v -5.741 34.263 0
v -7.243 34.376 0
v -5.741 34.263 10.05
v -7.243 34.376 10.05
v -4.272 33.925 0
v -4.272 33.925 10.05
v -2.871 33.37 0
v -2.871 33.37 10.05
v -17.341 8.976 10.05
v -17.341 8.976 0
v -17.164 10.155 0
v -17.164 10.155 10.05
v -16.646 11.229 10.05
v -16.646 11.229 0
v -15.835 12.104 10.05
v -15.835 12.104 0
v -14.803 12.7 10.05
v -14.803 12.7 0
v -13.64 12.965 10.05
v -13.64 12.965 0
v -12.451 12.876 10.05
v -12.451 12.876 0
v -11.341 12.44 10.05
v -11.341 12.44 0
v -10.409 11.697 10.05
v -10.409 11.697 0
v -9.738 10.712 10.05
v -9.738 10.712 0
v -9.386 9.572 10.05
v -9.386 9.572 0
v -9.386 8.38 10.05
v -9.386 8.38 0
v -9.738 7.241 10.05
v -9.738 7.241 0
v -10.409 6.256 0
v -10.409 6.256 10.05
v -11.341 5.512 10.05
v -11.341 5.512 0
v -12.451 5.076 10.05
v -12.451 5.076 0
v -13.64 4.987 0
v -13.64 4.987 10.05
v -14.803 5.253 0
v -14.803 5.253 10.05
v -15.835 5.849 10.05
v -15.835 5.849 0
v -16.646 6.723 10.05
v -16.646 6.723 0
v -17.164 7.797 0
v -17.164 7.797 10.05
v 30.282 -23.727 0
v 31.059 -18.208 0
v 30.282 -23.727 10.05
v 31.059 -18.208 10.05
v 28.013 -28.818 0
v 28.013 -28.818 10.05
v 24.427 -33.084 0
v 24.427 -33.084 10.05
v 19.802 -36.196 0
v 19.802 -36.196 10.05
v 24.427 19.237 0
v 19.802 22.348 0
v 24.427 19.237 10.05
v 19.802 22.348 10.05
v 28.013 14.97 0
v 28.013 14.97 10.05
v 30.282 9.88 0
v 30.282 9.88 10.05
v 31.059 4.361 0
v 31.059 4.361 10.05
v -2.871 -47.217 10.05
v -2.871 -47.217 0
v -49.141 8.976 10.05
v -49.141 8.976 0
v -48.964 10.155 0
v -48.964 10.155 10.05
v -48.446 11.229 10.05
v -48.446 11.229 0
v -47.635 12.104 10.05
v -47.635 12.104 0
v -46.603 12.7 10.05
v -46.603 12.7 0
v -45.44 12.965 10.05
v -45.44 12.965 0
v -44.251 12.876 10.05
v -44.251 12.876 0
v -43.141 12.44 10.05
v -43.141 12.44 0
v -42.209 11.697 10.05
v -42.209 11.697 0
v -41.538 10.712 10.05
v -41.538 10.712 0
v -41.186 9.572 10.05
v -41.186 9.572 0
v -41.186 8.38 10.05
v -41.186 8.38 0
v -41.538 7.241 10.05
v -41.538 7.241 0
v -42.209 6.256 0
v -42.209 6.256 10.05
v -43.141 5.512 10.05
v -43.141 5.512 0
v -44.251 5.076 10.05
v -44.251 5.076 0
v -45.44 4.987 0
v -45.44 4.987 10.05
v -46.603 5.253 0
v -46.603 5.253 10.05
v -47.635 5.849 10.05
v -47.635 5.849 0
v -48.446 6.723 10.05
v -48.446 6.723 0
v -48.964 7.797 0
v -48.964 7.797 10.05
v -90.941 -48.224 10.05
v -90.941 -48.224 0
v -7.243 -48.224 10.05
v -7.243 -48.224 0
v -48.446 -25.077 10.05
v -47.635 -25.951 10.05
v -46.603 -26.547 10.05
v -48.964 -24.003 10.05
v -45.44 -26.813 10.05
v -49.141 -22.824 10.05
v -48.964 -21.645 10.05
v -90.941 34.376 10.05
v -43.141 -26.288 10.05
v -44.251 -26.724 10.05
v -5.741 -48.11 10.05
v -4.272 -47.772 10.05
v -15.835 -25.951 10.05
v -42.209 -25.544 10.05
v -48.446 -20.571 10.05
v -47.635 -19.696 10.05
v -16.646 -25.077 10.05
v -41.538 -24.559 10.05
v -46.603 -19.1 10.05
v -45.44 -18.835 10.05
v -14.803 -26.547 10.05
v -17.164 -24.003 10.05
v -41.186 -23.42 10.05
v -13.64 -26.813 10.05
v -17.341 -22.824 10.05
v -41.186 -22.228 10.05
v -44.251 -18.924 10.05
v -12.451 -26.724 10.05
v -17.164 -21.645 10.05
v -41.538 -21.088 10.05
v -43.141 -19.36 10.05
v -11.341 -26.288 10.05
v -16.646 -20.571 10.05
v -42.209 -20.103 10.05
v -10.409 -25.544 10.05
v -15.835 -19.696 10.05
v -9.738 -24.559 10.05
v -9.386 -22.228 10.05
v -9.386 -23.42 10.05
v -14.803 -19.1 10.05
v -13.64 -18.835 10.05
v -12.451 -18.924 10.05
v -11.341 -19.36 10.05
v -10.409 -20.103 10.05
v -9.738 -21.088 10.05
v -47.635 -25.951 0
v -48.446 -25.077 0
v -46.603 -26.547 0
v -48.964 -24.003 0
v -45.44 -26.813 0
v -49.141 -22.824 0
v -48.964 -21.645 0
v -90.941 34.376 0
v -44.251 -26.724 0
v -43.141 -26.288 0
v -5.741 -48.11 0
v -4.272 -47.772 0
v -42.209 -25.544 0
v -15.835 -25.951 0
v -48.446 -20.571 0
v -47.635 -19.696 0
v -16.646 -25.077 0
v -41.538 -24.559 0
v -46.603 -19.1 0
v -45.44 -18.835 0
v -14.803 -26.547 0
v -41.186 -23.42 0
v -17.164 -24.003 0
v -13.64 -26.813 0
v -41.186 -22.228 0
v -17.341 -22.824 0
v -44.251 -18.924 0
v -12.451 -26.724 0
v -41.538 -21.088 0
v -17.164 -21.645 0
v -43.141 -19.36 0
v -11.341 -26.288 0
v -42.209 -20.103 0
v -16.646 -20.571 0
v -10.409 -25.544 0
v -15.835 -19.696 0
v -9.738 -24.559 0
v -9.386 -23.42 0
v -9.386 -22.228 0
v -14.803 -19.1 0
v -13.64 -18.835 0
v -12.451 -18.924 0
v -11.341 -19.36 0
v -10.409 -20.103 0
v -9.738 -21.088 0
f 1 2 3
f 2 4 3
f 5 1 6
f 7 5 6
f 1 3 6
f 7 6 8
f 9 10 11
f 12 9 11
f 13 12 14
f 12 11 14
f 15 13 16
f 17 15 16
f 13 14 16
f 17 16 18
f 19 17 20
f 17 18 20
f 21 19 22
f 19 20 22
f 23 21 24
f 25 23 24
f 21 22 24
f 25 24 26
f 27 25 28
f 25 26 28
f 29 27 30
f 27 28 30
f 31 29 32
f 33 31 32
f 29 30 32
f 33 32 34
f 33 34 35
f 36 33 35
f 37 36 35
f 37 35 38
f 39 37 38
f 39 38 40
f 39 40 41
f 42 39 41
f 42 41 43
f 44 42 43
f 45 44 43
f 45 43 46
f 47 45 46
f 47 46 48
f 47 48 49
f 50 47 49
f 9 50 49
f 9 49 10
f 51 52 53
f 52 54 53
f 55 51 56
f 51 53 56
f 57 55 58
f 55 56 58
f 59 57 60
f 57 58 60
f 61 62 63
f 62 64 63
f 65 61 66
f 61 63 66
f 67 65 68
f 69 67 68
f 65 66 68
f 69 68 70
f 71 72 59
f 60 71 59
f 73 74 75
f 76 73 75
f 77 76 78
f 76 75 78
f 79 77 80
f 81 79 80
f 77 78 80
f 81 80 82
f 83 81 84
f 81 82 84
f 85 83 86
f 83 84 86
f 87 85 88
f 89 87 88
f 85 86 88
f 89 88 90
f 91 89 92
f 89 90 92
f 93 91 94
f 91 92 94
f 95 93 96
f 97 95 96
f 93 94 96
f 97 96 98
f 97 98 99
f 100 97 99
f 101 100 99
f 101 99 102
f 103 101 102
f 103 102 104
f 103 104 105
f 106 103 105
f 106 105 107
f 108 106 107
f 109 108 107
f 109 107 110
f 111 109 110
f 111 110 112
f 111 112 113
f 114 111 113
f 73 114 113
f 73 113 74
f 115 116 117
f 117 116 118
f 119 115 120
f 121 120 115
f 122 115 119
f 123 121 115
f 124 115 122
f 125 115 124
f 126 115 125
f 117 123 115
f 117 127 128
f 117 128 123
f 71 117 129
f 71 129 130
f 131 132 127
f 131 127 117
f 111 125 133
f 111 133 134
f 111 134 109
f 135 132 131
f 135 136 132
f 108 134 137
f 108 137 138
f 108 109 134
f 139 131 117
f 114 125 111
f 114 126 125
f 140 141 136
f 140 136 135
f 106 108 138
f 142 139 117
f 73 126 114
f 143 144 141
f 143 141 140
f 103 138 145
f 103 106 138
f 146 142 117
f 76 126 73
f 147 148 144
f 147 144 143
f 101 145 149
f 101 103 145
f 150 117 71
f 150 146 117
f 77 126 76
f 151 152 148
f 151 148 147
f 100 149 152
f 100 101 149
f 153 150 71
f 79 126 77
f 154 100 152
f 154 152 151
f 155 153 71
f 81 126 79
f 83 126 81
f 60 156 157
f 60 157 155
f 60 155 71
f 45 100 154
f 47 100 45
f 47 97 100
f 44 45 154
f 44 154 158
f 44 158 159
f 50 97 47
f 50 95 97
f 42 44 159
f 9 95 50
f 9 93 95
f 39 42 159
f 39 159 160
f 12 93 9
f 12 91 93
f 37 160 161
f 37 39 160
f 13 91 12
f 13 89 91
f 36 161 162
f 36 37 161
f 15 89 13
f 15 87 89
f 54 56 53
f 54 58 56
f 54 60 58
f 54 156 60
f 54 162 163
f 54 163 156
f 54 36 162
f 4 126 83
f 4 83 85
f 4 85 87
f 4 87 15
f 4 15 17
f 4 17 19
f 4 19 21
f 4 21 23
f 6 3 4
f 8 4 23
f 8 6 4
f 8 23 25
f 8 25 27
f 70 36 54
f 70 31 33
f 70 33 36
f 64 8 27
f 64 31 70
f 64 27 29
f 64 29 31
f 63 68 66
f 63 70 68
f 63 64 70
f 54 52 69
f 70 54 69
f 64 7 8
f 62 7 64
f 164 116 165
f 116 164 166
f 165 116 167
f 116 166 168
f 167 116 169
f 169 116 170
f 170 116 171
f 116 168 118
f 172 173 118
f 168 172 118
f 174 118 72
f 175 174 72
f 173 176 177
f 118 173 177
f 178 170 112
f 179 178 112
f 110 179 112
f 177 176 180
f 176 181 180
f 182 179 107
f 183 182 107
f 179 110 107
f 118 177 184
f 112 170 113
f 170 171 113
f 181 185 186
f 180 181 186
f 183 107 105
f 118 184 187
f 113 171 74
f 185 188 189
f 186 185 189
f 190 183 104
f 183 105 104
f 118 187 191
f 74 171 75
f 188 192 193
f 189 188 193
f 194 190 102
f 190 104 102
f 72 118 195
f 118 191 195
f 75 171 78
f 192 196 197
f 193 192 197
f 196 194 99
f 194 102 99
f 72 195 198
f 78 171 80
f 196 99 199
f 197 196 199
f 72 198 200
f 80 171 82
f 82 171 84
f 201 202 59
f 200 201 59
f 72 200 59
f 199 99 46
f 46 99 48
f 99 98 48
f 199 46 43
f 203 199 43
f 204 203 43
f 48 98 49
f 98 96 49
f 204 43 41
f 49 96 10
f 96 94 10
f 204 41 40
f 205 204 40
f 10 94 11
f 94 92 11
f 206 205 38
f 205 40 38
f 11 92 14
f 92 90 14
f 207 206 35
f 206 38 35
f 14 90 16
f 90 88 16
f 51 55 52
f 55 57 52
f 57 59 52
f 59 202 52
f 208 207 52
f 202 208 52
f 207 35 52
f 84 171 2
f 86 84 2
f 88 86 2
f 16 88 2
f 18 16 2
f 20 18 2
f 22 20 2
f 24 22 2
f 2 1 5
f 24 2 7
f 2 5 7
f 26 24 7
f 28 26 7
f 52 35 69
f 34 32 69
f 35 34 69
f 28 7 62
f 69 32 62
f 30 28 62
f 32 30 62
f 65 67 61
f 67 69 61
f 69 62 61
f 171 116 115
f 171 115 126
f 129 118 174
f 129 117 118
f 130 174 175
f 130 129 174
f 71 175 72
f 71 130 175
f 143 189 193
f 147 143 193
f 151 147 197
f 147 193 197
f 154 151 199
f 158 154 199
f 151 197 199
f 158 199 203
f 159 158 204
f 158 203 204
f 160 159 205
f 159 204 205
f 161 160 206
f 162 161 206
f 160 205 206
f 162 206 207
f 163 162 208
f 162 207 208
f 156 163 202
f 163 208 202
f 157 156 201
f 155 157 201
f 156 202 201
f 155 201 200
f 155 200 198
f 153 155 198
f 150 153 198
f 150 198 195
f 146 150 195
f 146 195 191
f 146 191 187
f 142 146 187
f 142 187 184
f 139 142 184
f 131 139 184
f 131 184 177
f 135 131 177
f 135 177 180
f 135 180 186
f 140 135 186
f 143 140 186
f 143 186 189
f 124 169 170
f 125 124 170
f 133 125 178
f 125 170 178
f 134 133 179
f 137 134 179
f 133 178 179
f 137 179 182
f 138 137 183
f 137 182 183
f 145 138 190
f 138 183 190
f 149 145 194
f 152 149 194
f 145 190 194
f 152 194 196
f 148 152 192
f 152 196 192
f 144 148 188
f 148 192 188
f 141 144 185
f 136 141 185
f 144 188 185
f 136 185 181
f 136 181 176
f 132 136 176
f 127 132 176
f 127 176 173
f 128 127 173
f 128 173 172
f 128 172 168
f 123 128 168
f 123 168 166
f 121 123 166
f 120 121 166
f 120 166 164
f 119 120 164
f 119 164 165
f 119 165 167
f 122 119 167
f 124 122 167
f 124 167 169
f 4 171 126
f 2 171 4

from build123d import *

# Parameters (mm, degrees)
SKETCH1_W      = 122
SKETCH1_H      = 82.6
EXTRUDE1_DEPTH = 10.05
SKETCH2_R      = 4
EXTRUDE2_DEPTH = 11.05
EXTRUDE3_DEPTH = 11.05
FILLET1_R      = 10
FILLET2_R      = 20


with BuildPart() as part:
    # Sketch1 → Extrude1 (new body)
    with BuildSketch(Plane.XY):
        with Locations((-29.941398377, -6.923807929)):
            Rectangle(SKETCH1_W, SKETCH1_H)
    extrude(amount=EXTRUDE1_DEPTH)

    # Sketch2 → Extrude2 (cut, through all)
    with BuildSketch(Plane(origin=(0, 0, 0), x_dir=(-1, 0, 0), z_dir=(0, 0, -1))):
        with Locations((45.141398377, 8.976192071)):
            Circle(SKETCH2_R)
        with Locations((45.141398377, -22.823807929)):
            Circle(SKETCH2_R)
        with Locations((13.341398377, 8.976192071)):
            Circle(SKETCH2_R)
        with Locations((13.341398377, -22.823807929)):
            Circle(SKETCH2_R)
    extrude(amount=-EXTRUDE2_DEPTH, mode=Mode.SUBTRACT)

    # Sketch3 → Extrude3 (cut, through all)
    with BuildSketch(Plane(origin=(0, 0, 0), x_dir=(-1, 0, 0), z_dir=(0, 0, -1))):
        Polygon((4.941398377, 34.376192071), (-31.058601623, 16.876192071), (-39.457911359, 42.934117224), align=None)
        Polygon((-31.058601623, -30.723807929), (-39.457911359, -56.781733081), (4.941398377, -48.223807929), align=None)
    extrude(amount=-EXTRUDE3_DEPTH, mode=Mode.SUBTRACT)

    # Fillet1
    fillet1_edges = [part.edges().sort_by_distance(p)[0] for p in [
        (-4.941398377, 34.376192071, 5.025),
        (-4.941398377, -48.223807929, 5.025),
    ]]
    fillet(fillet1_edges, radius=FILLET1_R)

    # Fillet2
    fillet2_edges = [part.edges().sort_by_distance(p)[0] for p in [
        (31.058601623, 16.876192071, 5.025),
        (31.058601623, -30.723807929, 5.025),
    ]]
    fillet(fillet2_edges, radius=FILLET2_R)


solid = part.part
